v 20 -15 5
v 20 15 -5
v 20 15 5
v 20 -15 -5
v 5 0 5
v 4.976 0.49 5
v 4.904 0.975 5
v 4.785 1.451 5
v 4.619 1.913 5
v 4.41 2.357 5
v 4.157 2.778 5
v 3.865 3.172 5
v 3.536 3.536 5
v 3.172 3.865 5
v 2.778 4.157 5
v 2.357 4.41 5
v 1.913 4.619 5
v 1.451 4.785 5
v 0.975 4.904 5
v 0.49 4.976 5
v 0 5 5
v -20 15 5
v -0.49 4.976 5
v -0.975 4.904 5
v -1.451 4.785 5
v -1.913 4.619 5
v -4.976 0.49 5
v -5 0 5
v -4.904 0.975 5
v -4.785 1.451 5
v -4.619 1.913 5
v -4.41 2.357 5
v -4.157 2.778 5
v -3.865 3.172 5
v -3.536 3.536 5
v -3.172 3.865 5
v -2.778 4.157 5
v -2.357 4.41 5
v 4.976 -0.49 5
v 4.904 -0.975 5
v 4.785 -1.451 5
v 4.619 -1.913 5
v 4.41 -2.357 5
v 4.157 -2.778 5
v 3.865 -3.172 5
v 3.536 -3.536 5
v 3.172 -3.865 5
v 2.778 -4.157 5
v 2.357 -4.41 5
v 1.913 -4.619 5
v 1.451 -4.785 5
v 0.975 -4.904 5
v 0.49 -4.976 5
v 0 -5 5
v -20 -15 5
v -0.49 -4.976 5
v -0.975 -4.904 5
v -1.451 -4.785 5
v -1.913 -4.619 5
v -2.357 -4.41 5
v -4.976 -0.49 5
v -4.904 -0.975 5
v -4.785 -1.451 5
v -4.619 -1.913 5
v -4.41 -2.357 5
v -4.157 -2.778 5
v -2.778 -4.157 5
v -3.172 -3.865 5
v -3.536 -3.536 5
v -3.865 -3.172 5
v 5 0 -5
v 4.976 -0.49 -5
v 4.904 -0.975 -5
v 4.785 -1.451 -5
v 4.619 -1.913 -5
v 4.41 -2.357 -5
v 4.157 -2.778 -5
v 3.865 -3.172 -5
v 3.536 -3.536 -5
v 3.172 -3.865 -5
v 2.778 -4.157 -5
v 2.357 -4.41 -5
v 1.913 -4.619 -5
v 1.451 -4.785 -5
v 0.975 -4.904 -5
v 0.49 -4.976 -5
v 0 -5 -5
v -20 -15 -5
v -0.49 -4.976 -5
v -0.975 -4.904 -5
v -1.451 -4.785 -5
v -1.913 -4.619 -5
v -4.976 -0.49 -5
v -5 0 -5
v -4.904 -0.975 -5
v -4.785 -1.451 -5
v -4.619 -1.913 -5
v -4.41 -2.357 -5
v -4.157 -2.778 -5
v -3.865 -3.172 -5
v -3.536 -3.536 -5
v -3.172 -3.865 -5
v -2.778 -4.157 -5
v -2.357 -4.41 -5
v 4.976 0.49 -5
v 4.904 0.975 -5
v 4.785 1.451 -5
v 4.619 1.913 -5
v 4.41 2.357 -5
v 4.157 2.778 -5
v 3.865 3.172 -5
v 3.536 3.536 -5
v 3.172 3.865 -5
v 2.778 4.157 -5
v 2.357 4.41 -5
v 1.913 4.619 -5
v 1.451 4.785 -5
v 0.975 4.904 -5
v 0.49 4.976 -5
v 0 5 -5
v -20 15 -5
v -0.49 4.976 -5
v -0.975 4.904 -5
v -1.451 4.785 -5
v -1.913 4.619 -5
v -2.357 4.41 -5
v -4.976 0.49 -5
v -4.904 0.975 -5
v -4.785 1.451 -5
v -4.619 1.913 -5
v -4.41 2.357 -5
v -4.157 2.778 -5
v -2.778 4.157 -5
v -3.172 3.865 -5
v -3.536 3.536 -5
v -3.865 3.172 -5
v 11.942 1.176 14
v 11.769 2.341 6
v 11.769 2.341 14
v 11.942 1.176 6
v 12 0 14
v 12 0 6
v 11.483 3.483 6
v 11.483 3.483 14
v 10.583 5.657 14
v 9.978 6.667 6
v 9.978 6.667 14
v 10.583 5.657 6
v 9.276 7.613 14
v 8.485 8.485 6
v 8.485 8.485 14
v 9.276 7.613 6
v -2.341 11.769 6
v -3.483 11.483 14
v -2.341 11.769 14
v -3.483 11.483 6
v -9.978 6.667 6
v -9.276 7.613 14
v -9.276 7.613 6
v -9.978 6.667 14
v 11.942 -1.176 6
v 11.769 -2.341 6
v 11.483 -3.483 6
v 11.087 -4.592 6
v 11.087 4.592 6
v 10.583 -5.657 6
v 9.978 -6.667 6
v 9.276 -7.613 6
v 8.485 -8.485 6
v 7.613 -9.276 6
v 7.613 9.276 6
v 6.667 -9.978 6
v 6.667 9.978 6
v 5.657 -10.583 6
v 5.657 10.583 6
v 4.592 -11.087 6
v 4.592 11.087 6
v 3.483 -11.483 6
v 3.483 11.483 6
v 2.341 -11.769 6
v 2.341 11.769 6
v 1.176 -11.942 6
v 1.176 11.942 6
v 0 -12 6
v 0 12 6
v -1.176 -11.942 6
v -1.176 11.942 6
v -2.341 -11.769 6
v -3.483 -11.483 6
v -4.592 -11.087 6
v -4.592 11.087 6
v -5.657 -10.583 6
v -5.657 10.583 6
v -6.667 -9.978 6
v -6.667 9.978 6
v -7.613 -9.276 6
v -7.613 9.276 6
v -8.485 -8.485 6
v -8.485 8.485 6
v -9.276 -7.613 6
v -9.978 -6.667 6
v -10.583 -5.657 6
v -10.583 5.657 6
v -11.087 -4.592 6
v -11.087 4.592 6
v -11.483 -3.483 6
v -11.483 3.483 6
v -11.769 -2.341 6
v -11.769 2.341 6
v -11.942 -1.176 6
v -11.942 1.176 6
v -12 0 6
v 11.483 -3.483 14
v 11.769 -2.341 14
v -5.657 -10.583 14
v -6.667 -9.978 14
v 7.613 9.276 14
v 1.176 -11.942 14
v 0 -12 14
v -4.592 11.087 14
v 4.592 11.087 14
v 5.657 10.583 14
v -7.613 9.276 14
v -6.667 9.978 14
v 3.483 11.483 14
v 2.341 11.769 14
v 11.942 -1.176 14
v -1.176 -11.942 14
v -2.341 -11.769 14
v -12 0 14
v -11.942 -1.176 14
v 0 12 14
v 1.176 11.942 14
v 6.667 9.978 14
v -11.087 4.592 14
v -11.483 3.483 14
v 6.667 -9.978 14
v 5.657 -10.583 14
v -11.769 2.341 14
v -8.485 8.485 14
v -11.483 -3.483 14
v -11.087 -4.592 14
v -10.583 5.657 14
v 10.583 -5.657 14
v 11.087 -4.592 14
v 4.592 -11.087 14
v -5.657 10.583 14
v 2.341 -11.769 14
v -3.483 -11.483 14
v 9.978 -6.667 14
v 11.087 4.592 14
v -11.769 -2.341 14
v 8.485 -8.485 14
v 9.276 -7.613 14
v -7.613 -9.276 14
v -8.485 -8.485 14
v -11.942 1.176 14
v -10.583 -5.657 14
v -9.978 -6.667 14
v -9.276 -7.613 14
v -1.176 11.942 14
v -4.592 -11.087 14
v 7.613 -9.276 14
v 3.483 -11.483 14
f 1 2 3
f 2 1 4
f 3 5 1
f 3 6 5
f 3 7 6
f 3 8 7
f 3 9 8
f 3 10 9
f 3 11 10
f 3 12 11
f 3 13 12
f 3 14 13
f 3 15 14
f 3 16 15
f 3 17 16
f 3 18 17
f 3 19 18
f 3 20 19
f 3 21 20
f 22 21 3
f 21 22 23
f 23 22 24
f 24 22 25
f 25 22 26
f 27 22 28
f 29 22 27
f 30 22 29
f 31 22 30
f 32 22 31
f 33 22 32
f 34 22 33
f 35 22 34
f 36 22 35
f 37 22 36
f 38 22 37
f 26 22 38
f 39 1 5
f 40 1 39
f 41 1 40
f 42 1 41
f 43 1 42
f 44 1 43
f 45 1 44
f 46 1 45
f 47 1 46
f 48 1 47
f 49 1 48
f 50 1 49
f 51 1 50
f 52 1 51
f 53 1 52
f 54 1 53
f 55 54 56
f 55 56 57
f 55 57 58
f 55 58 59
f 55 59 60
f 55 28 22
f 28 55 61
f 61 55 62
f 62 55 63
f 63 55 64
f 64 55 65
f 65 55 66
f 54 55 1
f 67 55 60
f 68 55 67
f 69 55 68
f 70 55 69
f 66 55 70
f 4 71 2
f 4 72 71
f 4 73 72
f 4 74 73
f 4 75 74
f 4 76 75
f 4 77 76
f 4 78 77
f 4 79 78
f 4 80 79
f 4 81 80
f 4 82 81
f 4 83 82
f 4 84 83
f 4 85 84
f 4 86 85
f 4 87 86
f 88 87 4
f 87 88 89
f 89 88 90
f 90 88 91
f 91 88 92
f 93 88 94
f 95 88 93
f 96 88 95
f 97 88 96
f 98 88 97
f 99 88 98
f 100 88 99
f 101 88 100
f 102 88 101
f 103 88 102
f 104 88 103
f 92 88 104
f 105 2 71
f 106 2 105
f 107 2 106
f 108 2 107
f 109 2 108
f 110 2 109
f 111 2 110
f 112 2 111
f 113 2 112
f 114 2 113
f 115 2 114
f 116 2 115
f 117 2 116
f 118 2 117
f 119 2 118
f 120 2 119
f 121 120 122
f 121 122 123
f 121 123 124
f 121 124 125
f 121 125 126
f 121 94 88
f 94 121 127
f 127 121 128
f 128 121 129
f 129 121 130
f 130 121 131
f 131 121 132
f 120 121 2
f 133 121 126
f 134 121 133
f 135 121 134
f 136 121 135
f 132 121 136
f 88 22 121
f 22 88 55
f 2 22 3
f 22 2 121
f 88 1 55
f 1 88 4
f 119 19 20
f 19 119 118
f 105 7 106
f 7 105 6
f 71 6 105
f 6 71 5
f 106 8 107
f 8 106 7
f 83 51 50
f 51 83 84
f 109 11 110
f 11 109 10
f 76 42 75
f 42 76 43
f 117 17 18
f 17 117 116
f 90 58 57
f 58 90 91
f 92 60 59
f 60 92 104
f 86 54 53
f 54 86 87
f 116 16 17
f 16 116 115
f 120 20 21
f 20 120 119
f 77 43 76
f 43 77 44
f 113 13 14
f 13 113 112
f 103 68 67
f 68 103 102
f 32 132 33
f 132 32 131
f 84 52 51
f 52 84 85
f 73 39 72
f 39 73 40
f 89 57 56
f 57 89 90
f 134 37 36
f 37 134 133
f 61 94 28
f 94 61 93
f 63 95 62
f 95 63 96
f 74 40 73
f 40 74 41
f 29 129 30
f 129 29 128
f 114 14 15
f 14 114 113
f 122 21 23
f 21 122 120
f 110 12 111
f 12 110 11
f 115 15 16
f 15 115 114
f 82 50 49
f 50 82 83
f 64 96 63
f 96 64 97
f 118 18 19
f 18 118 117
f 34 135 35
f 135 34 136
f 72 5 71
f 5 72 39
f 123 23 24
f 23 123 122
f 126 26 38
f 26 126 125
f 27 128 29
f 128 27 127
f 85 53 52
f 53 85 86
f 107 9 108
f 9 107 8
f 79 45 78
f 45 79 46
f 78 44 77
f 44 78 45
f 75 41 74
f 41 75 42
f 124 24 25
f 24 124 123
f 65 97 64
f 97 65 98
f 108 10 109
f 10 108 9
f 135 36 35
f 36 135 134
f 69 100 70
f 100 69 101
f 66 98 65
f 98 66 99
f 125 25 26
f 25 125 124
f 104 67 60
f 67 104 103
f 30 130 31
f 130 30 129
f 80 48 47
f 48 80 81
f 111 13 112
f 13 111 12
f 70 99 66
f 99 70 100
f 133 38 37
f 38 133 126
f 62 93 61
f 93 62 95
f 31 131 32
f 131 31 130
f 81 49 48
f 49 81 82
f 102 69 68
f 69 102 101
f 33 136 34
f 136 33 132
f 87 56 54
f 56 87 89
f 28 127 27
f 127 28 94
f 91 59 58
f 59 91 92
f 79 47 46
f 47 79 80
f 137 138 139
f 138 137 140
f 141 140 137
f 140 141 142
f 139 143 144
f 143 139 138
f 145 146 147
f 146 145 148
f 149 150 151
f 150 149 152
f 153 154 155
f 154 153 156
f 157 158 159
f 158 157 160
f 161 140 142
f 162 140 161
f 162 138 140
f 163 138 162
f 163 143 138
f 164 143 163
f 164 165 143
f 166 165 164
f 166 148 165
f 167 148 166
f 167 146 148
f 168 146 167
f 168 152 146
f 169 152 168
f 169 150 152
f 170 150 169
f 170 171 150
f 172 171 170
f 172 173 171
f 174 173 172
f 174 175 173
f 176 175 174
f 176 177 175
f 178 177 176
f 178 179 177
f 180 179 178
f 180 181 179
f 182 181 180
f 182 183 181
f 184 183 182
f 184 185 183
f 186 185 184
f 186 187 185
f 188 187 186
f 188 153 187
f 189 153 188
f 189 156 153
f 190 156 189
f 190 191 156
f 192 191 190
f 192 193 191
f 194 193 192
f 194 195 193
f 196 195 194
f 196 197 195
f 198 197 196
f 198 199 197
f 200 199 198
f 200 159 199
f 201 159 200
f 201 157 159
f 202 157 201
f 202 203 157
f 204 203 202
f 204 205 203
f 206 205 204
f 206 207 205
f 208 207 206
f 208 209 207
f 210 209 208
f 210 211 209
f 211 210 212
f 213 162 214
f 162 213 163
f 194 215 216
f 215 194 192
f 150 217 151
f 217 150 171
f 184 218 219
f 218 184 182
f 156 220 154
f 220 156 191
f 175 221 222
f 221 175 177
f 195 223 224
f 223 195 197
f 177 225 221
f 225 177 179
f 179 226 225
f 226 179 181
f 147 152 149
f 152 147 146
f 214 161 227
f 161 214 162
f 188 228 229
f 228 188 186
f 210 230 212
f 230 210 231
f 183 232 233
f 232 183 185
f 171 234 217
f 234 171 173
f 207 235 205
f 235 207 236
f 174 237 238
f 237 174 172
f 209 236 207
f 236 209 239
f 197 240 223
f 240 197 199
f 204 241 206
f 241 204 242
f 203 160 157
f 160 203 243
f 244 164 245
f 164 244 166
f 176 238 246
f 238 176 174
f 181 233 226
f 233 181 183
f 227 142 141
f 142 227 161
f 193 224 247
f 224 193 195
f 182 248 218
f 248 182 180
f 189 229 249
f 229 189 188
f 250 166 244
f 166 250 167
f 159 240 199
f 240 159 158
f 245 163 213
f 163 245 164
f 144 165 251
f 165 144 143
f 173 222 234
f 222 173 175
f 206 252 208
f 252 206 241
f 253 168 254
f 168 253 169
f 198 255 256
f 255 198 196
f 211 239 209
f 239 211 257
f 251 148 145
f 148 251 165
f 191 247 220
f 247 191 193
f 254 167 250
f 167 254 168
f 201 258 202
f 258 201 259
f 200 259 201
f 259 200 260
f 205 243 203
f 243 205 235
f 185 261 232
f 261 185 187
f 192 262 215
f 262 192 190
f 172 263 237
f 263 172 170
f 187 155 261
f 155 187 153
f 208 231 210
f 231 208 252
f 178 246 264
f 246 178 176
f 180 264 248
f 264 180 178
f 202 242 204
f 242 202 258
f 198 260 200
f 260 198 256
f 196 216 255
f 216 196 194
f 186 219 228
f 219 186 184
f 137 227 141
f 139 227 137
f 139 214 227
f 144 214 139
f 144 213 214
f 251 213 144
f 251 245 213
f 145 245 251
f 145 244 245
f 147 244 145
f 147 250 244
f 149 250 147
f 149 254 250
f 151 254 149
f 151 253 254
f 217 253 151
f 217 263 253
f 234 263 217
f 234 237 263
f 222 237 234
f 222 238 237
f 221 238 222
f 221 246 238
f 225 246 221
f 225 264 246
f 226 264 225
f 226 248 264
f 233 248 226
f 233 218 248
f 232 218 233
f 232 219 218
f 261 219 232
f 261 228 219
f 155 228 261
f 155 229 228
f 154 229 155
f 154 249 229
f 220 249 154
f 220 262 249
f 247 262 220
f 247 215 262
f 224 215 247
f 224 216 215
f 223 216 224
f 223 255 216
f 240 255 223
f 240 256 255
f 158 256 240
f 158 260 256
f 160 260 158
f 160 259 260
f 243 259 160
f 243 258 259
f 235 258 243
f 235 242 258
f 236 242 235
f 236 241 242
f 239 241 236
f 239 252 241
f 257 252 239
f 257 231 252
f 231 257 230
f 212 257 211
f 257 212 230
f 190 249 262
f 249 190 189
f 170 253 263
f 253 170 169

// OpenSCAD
// Generated with SolidPython2 for OpenSCAD task-031
$fn = 64;

union() {
	difference() {
		cube(center = true, size = [40, 30, 10]);
		cylinder(center = true, h = 20, r = 5);
	}
	translate(v = [0, 0, 10]) {
		cylinder(center = true, h = 8, r = 12);
	}
}
